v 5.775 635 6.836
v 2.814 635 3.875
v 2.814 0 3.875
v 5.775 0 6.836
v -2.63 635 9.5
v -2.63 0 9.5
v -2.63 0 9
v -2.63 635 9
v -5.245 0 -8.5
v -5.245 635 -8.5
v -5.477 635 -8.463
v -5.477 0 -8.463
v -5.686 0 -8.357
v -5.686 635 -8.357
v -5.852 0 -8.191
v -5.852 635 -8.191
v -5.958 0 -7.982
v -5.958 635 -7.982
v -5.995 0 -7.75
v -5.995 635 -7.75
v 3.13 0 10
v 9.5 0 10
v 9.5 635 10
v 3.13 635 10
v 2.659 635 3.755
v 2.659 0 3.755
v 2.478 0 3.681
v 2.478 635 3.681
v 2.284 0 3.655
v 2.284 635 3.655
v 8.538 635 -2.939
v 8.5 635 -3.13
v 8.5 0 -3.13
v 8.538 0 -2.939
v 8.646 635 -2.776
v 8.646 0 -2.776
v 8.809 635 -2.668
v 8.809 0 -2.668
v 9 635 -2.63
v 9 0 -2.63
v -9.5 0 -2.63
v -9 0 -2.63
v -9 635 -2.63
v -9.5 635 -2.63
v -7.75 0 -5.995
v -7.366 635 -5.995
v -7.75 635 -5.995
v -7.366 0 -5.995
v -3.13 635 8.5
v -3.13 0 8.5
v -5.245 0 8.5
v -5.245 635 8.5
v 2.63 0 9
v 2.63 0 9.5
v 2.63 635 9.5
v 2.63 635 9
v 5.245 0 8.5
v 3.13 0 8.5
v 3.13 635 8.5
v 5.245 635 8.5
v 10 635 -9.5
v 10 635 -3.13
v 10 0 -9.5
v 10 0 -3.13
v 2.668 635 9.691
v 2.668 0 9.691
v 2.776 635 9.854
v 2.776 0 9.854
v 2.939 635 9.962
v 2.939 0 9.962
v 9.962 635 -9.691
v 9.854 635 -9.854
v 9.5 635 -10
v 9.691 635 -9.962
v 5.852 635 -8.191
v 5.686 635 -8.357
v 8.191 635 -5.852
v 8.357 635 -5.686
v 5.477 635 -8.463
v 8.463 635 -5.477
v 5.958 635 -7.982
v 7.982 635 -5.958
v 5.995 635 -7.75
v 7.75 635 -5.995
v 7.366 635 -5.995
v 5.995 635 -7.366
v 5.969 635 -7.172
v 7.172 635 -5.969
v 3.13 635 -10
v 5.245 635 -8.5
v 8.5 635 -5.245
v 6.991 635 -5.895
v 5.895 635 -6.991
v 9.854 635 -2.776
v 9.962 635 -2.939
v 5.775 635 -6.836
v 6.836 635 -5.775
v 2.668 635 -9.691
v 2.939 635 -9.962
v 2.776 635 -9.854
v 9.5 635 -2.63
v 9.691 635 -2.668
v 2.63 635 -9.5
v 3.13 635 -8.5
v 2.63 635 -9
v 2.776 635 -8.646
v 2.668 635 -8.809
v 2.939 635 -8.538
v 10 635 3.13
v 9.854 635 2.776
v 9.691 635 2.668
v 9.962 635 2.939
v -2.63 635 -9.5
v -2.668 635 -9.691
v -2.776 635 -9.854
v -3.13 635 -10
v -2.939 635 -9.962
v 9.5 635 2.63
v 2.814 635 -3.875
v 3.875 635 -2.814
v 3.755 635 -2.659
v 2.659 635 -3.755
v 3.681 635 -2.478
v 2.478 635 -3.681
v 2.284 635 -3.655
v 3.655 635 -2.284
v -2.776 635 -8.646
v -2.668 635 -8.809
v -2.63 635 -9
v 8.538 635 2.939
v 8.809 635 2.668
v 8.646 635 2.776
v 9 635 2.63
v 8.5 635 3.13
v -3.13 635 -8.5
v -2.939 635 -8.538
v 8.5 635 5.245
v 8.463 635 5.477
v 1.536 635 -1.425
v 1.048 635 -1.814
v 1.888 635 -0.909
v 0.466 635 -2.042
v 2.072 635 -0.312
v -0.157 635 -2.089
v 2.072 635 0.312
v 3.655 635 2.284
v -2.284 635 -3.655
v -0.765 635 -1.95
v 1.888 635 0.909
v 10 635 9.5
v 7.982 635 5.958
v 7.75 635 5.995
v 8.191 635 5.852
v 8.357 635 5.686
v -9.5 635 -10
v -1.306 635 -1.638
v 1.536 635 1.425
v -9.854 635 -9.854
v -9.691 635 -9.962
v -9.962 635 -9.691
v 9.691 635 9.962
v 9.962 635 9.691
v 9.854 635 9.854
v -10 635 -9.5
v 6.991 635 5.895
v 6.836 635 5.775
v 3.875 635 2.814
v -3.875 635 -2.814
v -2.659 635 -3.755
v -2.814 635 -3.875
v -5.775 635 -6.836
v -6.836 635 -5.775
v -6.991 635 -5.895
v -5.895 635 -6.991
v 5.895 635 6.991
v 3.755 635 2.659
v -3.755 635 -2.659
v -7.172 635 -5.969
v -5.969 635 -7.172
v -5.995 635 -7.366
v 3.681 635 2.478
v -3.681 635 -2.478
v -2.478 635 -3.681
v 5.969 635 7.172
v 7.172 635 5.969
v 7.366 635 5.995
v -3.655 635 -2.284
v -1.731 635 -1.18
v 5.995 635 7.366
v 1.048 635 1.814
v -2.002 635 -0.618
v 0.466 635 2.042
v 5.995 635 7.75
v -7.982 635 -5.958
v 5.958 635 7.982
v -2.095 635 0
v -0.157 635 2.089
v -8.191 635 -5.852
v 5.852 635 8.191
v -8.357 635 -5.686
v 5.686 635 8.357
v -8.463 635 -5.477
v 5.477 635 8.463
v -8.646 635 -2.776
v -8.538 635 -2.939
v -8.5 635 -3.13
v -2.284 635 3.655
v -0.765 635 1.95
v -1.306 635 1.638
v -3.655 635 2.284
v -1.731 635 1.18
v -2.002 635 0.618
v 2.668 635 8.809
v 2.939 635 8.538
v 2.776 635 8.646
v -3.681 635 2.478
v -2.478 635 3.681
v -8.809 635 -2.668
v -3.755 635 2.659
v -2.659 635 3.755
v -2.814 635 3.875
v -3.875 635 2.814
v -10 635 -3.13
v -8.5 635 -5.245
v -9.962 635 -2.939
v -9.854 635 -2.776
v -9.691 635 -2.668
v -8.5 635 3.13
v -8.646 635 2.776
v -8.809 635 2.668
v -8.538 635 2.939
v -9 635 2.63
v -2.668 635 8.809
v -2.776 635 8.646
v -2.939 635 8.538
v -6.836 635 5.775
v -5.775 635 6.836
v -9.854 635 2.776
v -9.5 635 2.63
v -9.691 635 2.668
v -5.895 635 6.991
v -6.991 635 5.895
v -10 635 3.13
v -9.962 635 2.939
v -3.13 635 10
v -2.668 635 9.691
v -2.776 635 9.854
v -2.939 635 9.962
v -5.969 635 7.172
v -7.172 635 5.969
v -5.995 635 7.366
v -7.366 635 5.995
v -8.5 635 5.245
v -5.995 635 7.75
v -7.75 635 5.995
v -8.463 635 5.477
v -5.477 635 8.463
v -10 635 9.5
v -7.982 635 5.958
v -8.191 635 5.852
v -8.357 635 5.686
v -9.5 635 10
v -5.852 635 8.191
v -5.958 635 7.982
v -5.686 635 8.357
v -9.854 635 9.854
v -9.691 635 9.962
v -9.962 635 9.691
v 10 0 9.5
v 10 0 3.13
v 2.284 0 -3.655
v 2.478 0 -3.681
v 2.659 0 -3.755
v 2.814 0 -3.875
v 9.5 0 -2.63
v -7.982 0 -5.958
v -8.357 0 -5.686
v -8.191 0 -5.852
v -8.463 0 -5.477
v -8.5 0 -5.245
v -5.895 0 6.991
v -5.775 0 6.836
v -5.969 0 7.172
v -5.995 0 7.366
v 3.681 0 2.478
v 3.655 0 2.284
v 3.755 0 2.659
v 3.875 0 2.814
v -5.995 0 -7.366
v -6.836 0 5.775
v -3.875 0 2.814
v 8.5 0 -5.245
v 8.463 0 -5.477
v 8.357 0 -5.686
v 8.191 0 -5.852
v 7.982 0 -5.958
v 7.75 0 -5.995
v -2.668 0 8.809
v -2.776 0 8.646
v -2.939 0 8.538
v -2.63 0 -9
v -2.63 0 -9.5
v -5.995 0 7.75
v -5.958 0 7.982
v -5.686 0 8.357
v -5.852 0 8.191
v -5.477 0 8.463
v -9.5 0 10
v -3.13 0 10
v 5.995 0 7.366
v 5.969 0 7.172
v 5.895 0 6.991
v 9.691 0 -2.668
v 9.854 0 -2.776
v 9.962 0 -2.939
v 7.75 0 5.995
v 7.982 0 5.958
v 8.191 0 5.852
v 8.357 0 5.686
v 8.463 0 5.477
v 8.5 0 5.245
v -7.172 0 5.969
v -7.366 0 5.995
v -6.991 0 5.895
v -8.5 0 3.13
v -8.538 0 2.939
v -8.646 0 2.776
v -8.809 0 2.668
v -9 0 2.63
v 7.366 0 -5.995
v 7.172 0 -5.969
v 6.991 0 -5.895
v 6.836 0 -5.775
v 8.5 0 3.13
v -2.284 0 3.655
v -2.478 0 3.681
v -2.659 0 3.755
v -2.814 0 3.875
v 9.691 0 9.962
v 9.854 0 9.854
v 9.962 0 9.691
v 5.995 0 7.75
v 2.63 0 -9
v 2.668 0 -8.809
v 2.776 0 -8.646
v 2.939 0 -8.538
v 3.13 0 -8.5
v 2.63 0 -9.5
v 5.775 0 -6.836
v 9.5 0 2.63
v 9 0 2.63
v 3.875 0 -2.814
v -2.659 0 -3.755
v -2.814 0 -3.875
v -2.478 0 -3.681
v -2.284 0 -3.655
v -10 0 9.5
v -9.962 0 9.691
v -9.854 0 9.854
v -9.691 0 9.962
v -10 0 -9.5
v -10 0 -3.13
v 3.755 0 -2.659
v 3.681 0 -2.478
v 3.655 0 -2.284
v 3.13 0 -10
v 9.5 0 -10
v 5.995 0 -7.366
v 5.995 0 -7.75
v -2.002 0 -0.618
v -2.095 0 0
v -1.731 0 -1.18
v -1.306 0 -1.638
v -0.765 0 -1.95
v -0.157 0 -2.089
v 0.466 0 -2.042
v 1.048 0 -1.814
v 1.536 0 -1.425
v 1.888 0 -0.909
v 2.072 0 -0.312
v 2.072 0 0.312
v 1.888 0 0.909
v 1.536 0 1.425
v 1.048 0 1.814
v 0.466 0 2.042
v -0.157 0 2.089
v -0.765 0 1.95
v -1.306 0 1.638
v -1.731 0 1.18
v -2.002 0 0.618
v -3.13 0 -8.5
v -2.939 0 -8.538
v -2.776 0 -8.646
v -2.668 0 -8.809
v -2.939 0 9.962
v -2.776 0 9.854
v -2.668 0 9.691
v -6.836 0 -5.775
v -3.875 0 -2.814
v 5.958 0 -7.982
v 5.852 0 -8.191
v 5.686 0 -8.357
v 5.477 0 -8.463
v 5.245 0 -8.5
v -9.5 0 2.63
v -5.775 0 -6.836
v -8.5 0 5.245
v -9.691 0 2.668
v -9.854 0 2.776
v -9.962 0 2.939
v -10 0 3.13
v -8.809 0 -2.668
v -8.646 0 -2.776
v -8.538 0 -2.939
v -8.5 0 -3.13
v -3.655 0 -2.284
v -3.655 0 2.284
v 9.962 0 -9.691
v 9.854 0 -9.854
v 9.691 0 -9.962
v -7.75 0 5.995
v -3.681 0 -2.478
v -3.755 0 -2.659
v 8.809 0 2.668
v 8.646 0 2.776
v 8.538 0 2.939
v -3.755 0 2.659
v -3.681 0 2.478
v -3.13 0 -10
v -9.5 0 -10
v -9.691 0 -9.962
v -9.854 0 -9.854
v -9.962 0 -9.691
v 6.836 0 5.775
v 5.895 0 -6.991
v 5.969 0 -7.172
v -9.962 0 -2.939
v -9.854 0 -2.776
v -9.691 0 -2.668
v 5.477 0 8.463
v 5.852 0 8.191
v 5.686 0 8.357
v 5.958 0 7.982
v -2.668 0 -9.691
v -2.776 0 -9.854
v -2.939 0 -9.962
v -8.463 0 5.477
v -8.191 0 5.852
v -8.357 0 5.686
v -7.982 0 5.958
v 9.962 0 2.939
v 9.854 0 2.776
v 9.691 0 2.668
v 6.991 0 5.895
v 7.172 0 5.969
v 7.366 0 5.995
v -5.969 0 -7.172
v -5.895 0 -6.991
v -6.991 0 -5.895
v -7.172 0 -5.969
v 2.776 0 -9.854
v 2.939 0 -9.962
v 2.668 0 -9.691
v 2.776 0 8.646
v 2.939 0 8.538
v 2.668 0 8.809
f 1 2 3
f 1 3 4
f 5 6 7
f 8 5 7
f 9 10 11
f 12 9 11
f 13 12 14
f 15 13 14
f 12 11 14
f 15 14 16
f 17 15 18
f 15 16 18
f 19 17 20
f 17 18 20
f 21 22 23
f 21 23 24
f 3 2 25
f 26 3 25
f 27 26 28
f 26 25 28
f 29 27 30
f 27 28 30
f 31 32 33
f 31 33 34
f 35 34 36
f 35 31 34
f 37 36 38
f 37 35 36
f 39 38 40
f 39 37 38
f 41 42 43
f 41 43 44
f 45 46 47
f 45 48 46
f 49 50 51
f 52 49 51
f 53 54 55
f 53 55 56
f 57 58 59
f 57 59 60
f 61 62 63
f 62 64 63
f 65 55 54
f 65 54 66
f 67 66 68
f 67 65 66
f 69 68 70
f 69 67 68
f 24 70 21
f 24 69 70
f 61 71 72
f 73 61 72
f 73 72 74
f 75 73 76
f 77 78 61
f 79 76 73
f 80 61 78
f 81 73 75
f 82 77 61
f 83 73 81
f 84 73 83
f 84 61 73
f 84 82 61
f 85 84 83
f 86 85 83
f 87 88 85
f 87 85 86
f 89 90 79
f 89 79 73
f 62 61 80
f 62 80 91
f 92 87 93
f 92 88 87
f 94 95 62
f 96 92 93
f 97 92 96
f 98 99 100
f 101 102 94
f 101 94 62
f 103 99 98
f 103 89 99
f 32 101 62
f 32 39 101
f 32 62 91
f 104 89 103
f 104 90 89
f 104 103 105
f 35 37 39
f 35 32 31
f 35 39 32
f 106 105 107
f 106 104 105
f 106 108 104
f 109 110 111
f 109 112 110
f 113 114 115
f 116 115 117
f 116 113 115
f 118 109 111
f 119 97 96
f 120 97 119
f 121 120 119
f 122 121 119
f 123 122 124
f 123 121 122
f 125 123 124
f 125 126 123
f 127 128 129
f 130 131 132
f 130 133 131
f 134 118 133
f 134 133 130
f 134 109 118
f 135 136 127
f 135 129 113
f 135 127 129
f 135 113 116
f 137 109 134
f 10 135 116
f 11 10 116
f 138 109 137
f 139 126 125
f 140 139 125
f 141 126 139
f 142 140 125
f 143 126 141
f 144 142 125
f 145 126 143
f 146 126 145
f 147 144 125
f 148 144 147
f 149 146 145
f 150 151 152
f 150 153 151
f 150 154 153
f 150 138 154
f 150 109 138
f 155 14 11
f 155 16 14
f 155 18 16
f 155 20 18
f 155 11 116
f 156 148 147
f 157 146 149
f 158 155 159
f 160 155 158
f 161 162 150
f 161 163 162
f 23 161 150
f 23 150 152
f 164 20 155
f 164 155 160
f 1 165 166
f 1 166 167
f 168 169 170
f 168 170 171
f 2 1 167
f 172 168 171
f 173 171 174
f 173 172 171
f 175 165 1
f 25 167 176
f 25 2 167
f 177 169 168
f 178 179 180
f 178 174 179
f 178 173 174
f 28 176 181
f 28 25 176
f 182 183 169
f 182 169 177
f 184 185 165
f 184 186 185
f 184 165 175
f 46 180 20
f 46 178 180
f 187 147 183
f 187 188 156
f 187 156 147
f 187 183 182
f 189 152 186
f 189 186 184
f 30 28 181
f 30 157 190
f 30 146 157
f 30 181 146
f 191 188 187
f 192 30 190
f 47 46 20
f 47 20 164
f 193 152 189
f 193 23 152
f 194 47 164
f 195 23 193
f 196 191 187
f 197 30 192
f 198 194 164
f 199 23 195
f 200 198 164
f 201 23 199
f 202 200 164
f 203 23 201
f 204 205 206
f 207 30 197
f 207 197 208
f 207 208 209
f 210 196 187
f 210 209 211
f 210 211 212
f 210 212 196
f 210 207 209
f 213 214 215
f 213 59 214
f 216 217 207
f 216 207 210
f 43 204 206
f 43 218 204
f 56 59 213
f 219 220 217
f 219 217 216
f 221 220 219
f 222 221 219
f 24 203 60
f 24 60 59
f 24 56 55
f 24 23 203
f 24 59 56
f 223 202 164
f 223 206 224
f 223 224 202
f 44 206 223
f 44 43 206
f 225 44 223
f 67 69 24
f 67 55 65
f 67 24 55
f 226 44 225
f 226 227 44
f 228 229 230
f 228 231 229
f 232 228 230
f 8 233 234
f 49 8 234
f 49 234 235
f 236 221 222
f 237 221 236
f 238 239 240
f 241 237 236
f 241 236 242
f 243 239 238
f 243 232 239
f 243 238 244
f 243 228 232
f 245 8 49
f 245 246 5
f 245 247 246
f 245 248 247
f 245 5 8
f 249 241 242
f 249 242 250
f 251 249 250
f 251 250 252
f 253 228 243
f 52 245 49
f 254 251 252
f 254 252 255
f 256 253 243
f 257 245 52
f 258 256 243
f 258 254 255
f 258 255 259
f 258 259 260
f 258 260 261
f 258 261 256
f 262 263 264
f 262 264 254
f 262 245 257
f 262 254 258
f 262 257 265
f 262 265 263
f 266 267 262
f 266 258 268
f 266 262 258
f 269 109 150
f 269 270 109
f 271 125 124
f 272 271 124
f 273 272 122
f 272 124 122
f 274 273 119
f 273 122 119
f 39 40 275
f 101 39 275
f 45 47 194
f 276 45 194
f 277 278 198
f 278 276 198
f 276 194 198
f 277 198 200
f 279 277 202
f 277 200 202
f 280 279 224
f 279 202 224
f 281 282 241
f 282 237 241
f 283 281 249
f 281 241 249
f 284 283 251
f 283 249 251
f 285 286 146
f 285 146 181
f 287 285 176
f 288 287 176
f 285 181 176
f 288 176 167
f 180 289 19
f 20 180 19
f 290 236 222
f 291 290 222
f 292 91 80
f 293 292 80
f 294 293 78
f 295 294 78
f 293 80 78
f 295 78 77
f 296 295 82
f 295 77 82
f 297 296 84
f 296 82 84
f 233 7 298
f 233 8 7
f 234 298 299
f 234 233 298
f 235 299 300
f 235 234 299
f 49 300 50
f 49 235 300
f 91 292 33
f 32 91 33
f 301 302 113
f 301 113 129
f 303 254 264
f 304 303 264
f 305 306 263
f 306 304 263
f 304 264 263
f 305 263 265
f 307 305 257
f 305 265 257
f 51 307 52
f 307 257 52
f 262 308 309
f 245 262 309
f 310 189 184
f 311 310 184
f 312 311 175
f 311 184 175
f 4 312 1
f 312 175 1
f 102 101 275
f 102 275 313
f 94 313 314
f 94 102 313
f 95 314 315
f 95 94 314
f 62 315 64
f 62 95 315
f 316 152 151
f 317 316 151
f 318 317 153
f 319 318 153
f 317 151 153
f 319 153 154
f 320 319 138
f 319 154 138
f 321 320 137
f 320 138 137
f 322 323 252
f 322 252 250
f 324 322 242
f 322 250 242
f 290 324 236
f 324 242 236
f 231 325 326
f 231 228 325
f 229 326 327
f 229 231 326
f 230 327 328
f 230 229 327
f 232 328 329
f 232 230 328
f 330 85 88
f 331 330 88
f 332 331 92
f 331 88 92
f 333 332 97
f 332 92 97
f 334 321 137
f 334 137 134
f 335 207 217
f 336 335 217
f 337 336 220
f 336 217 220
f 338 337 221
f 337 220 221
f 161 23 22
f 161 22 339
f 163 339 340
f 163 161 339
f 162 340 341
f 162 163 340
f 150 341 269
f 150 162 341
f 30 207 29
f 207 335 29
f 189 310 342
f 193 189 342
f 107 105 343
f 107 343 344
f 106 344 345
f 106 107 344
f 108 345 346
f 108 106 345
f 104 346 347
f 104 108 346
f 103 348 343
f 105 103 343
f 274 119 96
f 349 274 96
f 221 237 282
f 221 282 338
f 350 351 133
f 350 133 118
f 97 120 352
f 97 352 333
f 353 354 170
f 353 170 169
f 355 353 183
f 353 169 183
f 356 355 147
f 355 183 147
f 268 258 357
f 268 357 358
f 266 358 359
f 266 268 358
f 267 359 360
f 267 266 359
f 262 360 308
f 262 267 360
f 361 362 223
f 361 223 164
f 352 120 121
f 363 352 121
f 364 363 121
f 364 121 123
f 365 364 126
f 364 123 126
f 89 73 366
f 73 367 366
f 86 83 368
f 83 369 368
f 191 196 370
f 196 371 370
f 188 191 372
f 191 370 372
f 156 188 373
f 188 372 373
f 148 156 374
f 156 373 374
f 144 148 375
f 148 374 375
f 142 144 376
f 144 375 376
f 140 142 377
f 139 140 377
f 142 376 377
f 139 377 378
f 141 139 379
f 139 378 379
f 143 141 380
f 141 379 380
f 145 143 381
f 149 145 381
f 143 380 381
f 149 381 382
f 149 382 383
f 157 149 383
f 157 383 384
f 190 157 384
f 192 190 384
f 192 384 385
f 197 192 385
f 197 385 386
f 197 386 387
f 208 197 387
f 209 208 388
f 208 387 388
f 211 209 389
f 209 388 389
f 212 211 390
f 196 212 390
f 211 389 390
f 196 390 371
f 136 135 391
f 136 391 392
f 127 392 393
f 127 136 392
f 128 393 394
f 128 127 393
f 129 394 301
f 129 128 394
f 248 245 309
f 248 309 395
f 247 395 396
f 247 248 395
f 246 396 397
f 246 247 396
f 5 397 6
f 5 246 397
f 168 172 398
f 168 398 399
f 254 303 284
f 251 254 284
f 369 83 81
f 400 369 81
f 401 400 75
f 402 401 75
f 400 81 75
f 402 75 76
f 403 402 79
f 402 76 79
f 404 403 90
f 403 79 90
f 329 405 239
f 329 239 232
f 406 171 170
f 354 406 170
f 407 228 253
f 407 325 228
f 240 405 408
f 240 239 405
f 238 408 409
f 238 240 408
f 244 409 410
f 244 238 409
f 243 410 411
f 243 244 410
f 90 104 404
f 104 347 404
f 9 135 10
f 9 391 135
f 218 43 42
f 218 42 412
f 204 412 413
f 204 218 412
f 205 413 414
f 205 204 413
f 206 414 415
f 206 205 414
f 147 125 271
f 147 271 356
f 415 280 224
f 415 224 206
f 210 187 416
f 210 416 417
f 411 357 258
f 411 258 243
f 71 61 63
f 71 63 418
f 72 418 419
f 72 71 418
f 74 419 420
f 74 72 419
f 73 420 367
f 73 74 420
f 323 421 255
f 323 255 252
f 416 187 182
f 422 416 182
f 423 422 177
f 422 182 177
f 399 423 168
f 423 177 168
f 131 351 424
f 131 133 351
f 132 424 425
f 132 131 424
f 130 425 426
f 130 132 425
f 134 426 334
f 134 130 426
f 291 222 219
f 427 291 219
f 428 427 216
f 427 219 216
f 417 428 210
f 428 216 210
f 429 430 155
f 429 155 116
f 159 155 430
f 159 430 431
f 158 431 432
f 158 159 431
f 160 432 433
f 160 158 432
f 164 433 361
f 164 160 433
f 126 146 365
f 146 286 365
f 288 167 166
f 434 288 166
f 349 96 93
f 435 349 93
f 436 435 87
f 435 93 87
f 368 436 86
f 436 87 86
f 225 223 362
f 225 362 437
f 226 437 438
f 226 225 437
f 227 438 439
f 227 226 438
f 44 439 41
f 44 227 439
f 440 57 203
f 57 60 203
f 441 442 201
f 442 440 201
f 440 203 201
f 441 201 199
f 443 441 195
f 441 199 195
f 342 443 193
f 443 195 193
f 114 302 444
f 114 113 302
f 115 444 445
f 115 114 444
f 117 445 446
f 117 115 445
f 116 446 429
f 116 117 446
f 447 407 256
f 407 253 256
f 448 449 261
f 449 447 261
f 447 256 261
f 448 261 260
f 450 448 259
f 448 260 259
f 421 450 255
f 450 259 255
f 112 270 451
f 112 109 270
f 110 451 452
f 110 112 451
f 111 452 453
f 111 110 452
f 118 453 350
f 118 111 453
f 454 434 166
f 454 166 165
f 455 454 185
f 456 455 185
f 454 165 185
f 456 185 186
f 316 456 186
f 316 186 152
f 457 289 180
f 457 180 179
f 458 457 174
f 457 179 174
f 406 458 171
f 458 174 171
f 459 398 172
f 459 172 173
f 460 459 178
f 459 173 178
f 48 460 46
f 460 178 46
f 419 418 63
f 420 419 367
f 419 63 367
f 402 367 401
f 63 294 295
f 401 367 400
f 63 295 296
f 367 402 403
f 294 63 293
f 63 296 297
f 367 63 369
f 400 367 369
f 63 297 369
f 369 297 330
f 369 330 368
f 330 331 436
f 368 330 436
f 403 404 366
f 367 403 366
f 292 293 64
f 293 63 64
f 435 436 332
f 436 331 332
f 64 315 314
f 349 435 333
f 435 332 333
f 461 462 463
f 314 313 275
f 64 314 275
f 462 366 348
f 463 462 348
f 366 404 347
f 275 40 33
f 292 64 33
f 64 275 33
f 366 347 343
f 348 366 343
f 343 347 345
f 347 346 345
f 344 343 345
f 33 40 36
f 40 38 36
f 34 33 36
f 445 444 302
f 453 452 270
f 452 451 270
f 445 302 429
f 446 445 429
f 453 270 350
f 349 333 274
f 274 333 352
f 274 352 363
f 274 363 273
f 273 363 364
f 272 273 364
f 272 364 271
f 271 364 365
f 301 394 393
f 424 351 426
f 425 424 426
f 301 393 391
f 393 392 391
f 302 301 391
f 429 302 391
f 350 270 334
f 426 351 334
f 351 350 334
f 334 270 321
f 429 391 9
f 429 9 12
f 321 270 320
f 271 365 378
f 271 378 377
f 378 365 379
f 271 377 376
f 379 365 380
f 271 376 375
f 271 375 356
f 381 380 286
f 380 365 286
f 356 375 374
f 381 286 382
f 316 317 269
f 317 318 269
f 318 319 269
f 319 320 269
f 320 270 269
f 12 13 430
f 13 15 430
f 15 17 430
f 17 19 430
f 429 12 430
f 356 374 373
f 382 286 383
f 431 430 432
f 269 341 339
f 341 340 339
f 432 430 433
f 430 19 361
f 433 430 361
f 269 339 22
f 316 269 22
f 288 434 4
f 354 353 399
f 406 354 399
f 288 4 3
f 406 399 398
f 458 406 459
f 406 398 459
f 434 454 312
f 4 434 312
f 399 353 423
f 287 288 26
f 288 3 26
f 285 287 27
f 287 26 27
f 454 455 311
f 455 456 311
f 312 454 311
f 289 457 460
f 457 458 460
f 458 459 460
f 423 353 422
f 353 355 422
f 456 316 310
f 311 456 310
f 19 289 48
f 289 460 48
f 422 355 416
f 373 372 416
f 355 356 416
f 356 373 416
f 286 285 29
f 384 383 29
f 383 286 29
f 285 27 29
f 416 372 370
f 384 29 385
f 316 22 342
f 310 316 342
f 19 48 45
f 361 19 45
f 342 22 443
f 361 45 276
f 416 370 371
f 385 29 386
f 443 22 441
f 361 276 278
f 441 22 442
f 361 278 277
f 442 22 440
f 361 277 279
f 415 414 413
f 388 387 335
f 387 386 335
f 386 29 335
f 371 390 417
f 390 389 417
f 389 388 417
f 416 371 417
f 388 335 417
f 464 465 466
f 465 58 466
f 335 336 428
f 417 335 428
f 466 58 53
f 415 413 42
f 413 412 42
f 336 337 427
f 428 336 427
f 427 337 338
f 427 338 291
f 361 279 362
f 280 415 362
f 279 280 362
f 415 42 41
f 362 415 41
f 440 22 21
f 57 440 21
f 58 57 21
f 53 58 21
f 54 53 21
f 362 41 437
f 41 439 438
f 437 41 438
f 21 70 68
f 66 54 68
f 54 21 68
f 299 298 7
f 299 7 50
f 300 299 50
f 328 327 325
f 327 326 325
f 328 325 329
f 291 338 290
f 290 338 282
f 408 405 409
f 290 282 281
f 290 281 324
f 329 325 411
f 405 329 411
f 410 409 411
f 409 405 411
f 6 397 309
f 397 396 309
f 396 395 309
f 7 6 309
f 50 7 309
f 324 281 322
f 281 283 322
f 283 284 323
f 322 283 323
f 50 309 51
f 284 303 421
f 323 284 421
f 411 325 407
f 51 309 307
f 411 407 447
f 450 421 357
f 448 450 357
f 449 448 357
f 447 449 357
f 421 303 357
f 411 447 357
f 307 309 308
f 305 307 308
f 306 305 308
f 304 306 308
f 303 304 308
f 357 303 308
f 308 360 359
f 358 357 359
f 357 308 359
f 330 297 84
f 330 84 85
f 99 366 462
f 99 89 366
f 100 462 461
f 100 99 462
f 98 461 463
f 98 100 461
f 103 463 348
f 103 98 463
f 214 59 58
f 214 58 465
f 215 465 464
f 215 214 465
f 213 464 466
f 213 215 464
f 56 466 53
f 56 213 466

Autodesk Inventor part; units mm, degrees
ref_plane "YZ Plane" through (0, 0, 0) normal (1, 0, 0) x (0, 1, 0)
ref_plane "XZ Plane" through (0, 0, 0) normal (0, 1, 0) x (-1, 0, 0)
ref_plane "XY Plane" through (0, 0, 0) normal (0, 0, 1) x (1, 0, 0)
sketch "Sketch1" plane through (0, 0, 0) normal (0, 1, 0) x (-1, 0, 0)
  line L0 (0, -14) -> (0, 14) projected
  line L1 (-14, 0) -> (14, 0) projected
  line L2 (14, 0) -> (-14, 0) projected
  line L3 (0, -14) -> (0, 14) projected
  line L4 (2.5943, 3.655) -> (-2.5943, 3.655)
  line L5 (-3.655, 2.5943) -> (-3.655, -2.5943)
  line L6 (-2.5943, -3.655) -> (2.5943, -3.655)
  line L7 (3.655, -2.5943) -> (3.655, 2.5943)
  line L8 (-3.655, 3.655) -> (3.655, -3.655) construction
  line L9 (10, 10) -> (10, 2.63)
  line L10 (10, 2.63) -> (8.5, 2.63)
  line L11 (10, 10) -> (2.63, 10)
  line L12 (2.63, 10) -> (2.63, 8.5)
  line L13 (-10, 10) -> (-2.63, 10)
  line L14 (-2.63, 10) -> (-2.63, 8.5)
  line L15 (-10, 8.5) -> (-10, 10)
  line L16 (-10, 10) -> (-8.5, 10)
  line L17 (-8.5, 2.63) -> (-10, 2.63)
  line L18 (-10, 2.63) -> (-10, 10)
  line L19 (-10, -10) -> (-8.5, -10)
  line L20 (-8.5, -2.63) -> (-10, -2.63)
  line L21 (-10, -2.63) -> (-10, -10)
  line L22 (-10, -10) -> (-2.63, -10)
  line L23 (-2.63, -10) -> (-2.63, -8.5)
  line L24 (-10, -8.5) -> (-10, -10)
  line L25 (10, -10) -> (8.5, -10)
  line L26 (8.5, -2.63) -> (10, -2.63)
  line L27 (10, -2.63) -> (10, -10)
  line L28 (10, -10) -> (2.63, -10)
  line L29 (2.63, -10) -> (2.63, -8.5)
  line L30 (10, -8.5) -> (10, -10)
  circle A0 centre (0, 0) radius 2.095
  line L31 (5.995, -10) -> (2.63, -10)
  line L32 (-2.63, -10) -> (-5.995, -10)
  line L33 (10, -10) -> (2.63, -10)
  line L34 (-2.63, -10) -> (-10, -10)
  line L35 (10, -5.995) -> (10, -2.63)
  line L36 (10, 2.63) -> (10, 5.995)
  line L37 (10, 10) -> (10, 2.63)
  line L38 (10, -2.63) -> (10, -10)
  line L39 (-5.995, 10) -> (-2.63, 10)
  line L40 (2.63, 10) -> (5.995, 10)
  line L41 (-10, 10) -> (-2.63, 10)
  line L42 (2.63, 10) -> (10, 10)
  line L43 (-10, 5.995) -> (-10, 2.63)
  line L44 (-10, -2.63) -> (-10, -5.995)
  line L45 (-10, -10) -> (-10, -2.63)
  line L46 (-10, 2.63) -> (-10, 10)
  line L47 (-2.63, -8.5) -> (-5.995, -8.5)
  line L48 (-8.5, -5.995) -> (-8.5, -2.63)
  line L49 (-8.5, -5.995) -> (-7.0557, -5.995)
  line L50 (-5.995, -8.5) -> (-5.995, -7.0557)
  line L51 (-5.995, 7.0557) -> (-5.995, 8.5)
  line L52 (2.63, 8.5) -> (5.995, 8.5)
  line L53 (8.5, 2.63) -> (8.5, 5.995)
  line L54 (8.5, 5.995) -> (7.0557, 5.995)
  line L55 (5.995, 8.5) -> (5.995, 7.0557)
  line L56 (2.63, -8.5) -> (5.995, -8.5)
  line L57 (9.5607, -8.5) -> (10, -8.5)
  line L58 (8.5, -10) -> (8.5, -9.5607)
  line L59 (8.5, -5.995) -> (8.5, -2.63)
  line L60 (7.0557, -5.995) -> (8.5, -5.995)
  line L61 (5.995, -7.0557) -> (5.995, -8.5)
  line L62 (3.655, 3.655) -> (-0.5303, -0.5303) construction
  line L63 (-1.4814, -1.4814) -> (-3.655, -3.655) construction
  line L64 (-8.5, 10) -> (-8.5, 9.5607)
  line L65 (-8.5, 5.995) -> (-8.5, 2.63)
  line L66 (-2.63, 8.5) -> (-5.995, 8.5)
  line L67 (-9.5607, 8.5) -> (-10, 8.5)
  line L68 (-7.0557, 5.995) -> (-8.5, 5.995)
  line L69 (-3.655, 2.5943) -> (-7.0557, 5.995)
  line L70 (-2.5943, 3.655) -> (-5.995, 7.0557)
  line L71 (5.995, 7.0557) -> (2.5943, 3.655)
  line L72 (7.0557, 5.995) -> (3.655, 2.5943)
  line L73 (7.0557, -5.995) -> (3.655, -2.5943)
  line L74 (5.995, -7.0557) -> (2.5943, -3.655)
  line L75 (-2.5943, -3.655) -> (-5.995, -7.0557)
  line L76 (-3.655, -2.5943) -> (-7.0557, -5.995)
  dimension "d26" = 4.19
  dimension "d0" = 20
  dimension "d1" = 20
  dimension "d2" = 7.31
  dimension "d3" = 7.31
  dimension "d4" = 20
  dimension "d5" = 11.99
  dimension "d6" = 11.99
  dimension "d11" = 7.37
  dimension "d12" = 1.5
  dimension "d13" = 7.37
  dimension "d14" = 1.5
  dimension "d15" = 7.37
  dimension "d16" = 1.5
  dimension "d17" = 7.37
  dimension "d18" = 1.5
  dimension "d19" = 7.37
  dimension "d20" = 7.37
  dimension "d21" = 1.5
  dimension "d22" = 1.5
  dimension "d23" = 7.37
  dimension "d24" = 7.37
  dimension "d25" = 1.5
extrude "Extrusion1" add sketch "Sketch1" along normal blind 635 contours L6 L75 L50 L47 L23 L22 L19 L21 L20 L48 L49 L76 L5 L1 A0 L0 | L0 A0 L1 L7 L73 L60 L59 L26 L27 L25 L28 L29 L56 L61 L74 L6 | L1 L5 L69 L68 L65 L17 L18 L15 L13 L14 L66 L51 L70 L4 L0 A0 | A0 L0 L4 L71 L55 L52 L12 L11 L9 L10 L53 L54 L72 L7 L1
fillet "Fillet1" radius 0.5 20 edges at (10, 317.5, 10) (2.63, 317.5, 10) (-2.63, 317.5, 10) (-2.63, 317.5, 8.5) (10, 317.5, 2.63) (8.5, 317.5, 2.63) (10, 317.5, -2.63) (8.5, 317.5, -2.63) (10, 317.5, -10) (2.63, 317.5, -8.5) (-2.63, 317.5, -10) (-2.63, 317.5, -8.5) (2.63, 317.5, -10) (-10, 317.5, -10) (-8.5, 317.5, -2.63) (-10, 317.5, -2.63) (-8.5, 317.5, 2.63) (-10, 317.5, 2.63) (-10, 317.5, 10) (2.63, 317.5, 8.5)
fillet "Fillet2" radius 0.75 24 edges at (-7.0557, 317.5, 5.995) (-3.655, 317.5, 2.5943) (-8.5, 317.5, -5.995) (-7.0557, 317.5, -5.995) (-5.995, 317.5, -8.5) (3.655, 317.5, -2.5943) (7.0557, 317.5, -5.995) (-2.5943, 317.5, 3.655) (-5.995, 317.5, 7.0557) (3.655, 317.5, 2.5943) (7.0557, 317.5, 5.995) (8.5, 317.5, 5.995) (8.5, 317.5, -5.995) (2.5943, 317.5, 3.655) (5.995, 317.5, 7.0557) (5.995, 317.5, 8.5) (-5.995, 317.5, 8.5) (-8.5, 317.5, 5.995) (2.5943, 317.5, -3.655) (5.995, 317.5, -7.0557) (5.995, 317.5, -8.5) (-5.995, 317.5, -7.0557) (-2.5943, 317.5, -3.655) (-3.655, 317.5, -2.5943)
properties part number "Profile_BaseModel_20mm-10" material "Aluminum 6061"
